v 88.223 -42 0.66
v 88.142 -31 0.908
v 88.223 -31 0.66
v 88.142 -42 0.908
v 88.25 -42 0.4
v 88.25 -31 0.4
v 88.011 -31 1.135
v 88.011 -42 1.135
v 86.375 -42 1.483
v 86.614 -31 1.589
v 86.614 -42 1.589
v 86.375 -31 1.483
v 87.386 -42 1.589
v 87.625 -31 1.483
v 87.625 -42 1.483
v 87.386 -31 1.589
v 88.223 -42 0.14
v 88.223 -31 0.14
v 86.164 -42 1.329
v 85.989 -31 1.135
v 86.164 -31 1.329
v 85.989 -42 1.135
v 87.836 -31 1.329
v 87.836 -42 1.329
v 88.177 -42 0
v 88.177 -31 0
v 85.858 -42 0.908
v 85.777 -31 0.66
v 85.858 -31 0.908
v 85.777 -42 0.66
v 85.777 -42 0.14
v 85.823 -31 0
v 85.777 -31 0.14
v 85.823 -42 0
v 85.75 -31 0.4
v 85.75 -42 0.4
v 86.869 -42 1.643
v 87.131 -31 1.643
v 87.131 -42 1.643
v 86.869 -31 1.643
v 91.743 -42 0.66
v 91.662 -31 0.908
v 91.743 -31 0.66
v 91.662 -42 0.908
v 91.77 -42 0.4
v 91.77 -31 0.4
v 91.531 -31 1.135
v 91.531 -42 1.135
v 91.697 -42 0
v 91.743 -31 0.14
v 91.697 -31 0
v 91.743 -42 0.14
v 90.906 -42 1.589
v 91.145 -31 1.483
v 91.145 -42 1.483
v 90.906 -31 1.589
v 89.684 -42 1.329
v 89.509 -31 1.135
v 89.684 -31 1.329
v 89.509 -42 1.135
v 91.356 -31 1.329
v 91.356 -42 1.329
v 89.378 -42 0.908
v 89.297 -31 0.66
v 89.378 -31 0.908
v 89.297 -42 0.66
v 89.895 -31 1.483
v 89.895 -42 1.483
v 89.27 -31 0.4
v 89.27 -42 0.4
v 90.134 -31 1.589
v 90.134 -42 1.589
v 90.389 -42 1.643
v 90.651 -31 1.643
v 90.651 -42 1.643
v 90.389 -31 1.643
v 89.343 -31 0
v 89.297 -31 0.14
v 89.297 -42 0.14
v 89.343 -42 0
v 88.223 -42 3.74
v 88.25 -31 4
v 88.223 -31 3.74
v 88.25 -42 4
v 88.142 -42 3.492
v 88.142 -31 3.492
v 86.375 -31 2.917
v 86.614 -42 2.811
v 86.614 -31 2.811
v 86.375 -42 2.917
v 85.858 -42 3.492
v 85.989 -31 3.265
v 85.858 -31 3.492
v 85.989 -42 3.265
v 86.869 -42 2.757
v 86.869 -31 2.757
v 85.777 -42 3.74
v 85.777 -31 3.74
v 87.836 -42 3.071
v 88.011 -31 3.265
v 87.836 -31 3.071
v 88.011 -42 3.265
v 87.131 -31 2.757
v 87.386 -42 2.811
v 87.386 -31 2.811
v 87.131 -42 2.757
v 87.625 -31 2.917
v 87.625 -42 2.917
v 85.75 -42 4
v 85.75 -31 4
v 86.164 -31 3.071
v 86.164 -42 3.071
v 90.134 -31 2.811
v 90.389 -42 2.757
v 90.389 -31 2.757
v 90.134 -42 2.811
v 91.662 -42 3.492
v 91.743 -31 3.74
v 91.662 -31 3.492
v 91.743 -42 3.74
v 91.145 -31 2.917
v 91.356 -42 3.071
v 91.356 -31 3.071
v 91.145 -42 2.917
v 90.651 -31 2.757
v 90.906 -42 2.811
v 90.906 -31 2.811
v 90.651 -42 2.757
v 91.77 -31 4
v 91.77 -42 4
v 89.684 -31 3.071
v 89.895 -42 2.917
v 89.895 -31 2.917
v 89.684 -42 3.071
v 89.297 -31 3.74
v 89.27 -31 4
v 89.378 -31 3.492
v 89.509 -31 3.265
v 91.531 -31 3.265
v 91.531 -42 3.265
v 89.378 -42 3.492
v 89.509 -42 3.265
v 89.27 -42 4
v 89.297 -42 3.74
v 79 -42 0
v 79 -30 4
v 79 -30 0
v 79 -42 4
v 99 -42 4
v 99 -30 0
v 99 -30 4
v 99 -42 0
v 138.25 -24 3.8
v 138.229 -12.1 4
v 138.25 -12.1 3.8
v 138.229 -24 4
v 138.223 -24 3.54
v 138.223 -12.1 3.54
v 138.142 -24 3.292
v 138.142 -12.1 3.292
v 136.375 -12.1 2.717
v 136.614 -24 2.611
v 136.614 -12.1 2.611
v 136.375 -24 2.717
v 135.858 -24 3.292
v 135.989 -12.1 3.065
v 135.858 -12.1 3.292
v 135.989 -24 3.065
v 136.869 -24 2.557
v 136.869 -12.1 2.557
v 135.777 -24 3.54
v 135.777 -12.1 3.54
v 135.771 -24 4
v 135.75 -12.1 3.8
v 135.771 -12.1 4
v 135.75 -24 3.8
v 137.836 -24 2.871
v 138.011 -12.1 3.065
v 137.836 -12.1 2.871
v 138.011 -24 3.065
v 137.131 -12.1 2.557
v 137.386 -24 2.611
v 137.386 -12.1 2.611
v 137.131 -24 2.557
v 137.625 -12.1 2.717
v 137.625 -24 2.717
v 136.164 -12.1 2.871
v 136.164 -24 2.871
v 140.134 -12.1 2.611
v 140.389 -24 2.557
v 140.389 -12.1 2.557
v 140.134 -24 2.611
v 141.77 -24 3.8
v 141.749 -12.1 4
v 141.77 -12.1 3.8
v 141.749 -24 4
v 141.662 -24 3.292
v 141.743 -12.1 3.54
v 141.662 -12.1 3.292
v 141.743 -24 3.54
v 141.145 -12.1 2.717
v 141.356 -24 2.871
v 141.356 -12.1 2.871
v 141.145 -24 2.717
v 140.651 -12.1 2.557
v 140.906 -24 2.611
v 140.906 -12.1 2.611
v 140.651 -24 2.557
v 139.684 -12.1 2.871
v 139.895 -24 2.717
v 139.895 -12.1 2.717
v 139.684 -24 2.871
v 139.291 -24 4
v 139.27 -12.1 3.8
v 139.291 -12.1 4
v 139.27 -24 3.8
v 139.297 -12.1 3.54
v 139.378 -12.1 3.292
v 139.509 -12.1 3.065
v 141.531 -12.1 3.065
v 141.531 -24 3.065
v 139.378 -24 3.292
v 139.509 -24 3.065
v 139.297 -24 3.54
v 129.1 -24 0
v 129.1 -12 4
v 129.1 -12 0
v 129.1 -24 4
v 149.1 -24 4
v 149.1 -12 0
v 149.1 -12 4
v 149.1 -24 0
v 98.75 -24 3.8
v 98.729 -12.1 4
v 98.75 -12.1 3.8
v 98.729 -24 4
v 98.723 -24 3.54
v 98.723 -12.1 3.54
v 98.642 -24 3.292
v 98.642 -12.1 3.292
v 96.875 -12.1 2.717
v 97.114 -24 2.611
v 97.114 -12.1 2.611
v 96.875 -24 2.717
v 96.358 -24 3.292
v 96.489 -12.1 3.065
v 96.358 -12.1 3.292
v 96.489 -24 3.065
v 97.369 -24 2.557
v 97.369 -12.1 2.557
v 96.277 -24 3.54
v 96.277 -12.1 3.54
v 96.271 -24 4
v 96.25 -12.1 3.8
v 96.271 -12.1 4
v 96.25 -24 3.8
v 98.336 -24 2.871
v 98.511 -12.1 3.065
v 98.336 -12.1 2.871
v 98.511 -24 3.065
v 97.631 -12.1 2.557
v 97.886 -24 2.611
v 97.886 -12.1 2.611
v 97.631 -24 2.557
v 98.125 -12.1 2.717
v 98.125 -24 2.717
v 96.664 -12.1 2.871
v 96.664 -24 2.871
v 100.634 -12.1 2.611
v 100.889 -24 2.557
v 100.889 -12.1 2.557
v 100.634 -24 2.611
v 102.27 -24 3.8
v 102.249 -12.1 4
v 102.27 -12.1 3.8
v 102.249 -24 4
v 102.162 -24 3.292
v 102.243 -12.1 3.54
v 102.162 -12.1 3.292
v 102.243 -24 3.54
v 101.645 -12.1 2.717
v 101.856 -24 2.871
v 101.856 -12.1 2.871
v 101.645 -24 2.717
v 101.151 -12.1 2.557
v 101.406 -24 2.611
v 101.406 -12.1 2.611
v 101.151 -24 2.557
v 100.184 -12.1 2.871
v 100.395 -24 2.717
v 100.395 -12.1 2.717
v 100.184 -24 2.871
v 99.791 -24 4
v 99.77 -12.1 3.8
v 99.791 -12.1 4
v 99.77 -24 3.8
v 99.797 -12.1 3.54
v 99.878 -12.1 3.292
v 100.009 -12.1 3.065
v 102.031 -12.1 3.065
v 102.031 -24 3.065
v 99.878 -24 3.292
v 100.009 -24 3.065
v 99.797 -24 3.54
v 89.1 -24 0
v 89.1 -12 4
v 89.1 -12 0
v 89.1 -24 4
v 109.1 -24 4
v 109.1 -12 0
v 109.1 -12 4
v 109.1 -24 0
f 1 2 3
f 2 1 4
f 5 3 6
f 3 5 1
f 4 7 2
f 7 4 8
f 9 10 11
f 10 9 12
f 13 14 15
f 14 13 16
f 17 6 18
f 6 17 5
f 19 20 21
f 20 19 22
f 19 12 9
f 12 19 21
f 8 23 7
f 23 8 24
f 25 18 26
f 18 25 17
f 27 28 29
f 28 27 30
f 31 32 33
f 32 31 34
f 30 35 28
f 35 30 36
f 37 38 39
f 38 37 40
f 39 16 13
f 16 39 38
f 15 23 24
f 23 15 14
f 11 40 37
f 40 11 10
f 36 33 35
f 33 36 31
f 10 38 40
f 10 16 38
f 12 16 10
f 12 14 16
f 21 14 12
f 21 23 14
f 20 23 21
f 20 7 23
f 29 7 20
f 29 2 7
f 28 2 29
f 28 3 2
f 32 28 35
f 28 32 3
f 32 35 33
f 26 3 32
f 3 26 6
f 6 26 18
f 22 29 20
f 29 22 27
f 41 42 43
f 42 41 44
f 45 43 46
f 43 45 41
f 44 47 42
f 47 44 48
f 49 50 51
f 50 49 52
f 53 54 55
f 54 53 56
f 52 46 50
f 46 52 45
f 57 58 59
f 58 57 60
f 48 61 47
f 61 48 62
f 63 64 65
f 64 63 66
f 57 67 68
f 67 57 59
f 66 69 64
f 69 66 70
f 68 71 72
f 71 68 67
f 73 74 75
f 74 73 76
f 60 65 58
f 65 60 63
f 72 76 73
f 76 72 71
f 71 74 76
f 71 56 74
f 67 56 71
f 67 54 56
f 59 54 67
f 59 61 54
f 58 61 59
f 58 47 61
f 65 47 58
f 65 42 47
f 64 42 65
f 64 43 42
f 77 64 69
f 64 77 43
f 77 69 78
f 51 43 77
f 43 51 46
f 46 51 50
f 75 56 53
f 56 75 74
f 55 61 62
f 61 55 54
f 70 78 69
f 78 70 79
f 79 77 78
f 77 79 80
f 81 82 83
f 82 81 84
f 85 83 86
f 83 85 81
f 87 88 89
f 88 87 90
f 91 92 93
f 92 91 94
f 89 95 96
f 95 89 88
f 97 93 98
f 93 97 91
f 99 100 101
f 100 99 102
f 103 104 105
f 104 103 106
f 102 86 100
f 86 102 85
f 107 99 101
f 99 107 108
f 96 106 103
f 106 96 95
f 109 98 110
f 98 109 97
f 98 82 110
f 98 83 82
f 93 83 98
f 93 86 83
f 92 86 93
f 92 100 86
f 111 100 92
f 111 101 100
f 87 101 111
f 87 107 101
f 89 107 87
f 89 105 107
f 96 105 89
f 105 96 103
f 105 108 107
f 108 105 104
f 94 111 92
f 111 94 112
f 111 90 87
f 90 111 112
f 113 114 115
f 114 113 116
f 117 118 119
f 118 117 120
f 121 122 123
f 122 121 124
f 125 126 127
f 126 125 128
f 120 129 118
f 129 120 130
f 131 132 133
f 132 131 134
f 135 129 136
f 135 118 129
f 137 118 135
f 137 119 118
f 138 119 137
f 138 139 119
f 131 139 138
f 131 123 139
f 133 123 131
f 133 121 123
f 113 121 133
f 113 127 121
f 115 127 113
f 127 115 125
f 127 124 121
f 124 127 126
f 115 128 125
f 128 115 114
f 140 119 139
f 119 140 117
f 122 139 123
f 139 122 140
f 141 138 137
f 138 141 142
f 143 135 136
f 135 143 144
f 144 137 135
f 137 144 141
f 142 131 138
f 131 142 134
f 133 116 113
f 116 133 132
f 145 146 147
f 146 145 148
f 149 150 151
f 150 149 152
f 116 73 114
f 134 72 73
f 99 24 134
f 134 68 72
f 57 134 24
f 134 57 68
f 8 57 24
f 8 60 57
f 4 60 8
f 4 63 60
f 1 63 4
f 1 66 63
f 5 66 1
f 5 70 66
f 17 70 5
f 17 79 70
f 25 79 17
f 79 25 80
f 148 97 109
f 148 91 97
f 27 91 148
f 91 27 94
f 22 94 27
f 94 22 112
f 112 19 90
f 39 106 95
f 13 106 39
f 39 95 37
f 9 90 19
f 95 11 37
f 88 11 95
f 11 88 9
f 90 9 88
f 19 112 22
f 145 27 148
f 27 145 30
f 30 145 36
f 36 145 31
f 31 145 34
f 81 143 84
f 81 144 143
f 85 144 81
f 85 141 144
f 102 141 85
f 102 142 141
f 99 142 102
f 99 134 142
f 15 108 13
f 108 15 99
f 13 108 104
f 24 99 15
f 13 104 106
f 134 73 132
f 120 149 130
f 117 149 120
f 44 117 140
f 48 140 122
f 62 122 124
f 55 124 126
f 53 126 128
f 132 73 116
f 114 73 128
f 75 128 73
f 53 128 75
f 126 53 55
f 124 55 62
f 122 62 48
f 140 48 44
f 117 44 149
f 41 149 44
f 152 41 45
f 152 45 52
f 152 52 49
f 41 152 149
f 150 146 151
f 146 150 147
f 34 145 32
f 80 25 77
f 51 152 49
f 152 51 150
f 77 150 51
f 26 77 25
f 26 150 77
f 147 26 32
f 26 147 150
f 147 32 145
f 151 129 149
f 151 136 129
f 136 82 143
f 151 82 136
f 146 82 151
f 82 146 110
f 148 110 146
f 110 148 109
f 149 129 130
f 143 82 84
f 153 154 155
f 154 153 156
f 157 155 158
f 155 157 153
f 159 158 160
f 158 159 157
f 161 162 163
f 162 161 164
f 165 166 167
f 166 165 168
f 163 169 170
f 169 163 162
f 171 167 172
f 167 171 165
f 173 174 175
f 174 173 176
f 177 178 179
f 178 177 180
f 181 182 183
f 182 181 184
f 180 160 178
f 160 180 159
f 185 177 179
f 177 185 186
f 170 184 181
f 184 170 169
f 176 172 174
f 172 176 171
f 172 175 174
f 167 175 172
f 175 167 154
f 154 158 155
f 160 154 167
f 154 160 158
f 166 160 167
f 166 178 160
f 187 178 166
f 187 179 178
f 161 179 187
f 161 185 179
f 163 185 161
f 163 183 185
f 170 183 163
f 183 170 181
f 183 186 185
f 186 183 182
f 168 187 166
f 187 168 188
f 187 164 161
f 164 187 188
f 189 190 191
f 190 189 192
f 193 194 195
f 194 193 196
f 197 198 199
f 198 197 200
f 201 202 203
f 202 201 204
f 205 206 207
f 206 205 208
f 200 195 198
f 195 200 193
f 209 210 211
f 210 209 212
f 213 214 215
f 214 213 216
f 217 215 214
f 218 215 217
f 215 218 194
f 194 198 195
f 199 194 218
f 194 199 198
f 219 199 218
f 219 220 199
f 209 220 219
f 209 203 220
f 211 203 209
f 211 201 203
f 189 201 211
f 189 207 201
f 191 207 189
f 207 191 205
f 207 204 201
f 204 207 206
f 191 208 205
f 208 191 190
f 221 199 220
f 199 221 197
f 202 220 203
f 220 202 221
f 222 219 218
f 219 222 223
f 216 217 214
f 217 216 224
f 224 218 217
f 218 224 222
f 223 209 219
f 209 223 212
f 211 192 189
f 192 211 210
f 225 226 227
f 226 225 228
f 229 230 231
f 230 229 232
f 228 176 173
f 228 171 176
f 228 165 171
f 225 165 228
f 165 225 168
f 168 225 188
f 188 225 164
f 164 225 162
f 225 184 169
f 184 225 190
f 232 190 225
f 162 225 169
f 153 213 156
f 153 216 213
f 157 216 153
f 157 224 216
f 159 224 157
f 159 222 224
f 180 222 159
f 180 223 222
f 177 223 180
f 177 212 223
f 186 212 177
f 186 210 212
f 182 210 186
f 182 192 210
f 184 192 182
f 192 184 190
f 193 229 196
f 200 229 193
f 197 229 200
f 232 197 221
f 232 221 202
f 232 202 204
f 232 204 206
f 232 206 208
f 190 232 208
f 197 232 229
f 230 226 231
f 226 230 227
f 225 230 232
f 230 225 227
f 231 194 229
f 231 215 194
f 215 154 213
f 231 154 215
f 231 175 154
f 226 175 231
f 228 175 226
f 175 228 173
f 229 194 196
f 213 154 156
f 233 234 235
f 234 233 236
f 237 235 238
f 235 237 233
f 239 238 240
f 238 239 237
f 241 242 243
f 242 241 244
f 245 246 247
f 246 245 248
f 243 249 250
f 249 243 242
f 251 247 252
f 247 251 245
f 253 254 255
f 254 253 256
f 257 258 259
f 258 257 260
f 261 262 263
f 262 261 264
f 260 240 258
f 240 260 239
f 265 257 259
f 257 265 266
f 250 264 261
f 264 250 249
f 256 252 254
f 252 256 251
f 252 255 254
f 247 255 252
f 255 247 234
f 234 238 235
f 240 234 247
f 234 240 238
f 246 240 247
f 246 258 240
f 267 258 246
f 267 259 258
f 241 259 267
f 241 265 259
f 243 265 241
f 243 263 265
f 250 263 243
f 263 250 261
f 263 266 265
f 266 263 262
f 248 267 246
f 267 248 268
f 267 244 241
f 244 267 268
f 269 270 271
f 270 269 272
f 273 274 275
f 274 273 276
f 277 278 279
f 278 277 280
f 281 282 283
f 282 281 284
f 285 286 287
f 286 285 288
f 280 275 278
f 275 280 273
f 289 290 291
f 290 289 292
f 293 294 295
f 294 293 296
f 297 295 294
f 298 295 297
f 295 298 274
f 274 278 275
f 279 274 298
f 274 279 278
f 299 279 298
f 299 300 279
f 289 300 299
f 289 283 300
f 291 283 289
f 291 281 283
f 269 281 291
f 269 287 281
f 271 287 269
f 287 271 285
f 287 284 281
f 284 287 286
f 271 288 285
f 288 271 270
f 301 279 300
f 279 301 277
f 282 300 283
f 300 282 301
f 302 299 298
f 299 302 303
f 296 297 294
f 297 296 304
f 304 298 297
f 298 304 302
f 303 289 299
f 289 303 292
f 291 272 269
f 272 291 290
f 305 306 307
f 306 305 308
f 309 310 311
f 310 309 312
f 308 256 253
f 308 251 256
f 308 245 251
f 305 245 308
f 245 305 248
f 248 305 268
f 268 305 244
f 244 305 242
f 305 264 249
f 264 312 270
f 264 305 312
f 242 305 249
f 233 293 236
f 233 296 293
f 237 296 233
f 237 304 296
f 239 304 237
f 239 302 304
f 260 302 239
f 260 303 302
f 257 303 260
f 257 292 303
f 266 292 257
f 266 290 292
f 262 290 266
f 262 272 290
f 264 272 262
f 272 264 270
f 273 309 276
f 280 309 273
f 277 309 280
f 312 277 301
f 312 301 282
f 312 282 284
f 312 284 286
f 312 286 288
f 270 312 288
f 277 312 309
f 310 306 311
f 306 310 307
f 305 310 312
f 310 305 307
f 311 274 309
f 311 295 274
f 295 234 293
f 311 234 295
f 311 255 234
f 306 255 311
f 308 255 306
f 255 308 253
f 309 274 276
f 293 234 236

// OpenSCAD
/*

__________ ____ ___  _____________  __.___.____    .____     
\______   \    |   \/   _____/    |/ _|   |    |   |    |    
 |    |  _/    |   /\_____  \|      < |   |    |   |    |    
 |    |   \    |  / /        \    |  \|   |    |___|    |___ 
 |______  /______/ /_______  /____|__ \___|_______ \_______ \
        \/                 \/        \/           \/       \/


*/
/*                      
Buskill USB-A Magnetic breakaway Shell Assembly     
GNU General Public License v3.0 
Author: Melanie Allen
*/

/*
Description

BusKill is a Dead Man Switch triggered when a magnetic breakaway is tripped, severing a USB connection. This design is for USB-A.

The user will have a USB, a USB extension cable, and the magnetic breakaway. 

The "breakaway" receives the USB from the USB cable with a female USB port. It is in four parts, the base, two middle pieces, and the lid. It contains 4 pogo pins and 2 magnets. It separates from the release when the cord is pulled.

The "release" is attached to a cord ending in a male USB. It is in three parts, the base, the middle, and the lid. It contains 4 pogo receptors and 2 magnets.

The middle pieces are created in order to stabilize the pogo pins and magnets from the top and bottom pieces to keep them from interfering with each other.

When the magnets on the breakaway and release connect, the pogo pins and pogo receptors must meet and establish the USB connection.

The breakaway and release plugs must be designed asymmetrically to prevent the connection from happening the wrong way. 

The case must be designed so that the user can completely dissemble it and ensure there has been no tampering. No glue must be required. The base and lid connect together with tiny screws and embedded nuts. There will be a middle wall piece for both ends that separates top and bottom components.

This design differs from another design in the repo in that the magnets are modelled as disks. These disk magnets are easily found online and can be acquired more easily than the hexagonal magnets. 

docs.buskill.in
buskill.in
*/


module main(){

zpascifier = 0.02; //value to prevent z-fighting

/* * Magnet * */

//Download magnet2.stl from repo into the same folder as this .scad file

magnet_distance=12.5;

module magnet(){
    color( "SlateGrey", 1.0 )
    rotate([90,0,0])
        difference() {
    cylinder(h=2, r=2,$fn = 30);
}

    
}
//magnet();

/* * Notch * */

//The notch should extrude from the release, and cut into the breakaway so that they can only connect in one orientation.

module notch(){
    color("white"){
        rotate([90,0,0]){
            cylinder($fn = 30, $fa = 30, $fs = 2, .5,.5,.5,$fn=3);
        }
    }
}
//notch();

/* * Screw and Nut * */

module M3HexNut() {
  height = 6;
  size = 3.2;
  sides = 6;
  translate([0, 0, -height/2]) 
      cylinder(d=size, h=height, center=true);
    
}

//M3HexNut();


module M3Screw() {
s_h =7; // screw length
s_r1 = 1; // screw shaft radius
s_r2 = 2; // screw top radius

// create the screw body
cylinder(r = s_r1, h = 8, center = true);

// create the screw head
translate([0, 0, s_h - s_r2]) {
cylinder(r = s_r2, h = s_r2, center = true);
}
}
//M3Screw();

/*
__________       .__                               
\______   \ ____ |  |   ____ _____    ______ ____  
 |       _// __ \|  | _/ __ \\__  \  /  ___// __ \ 
 |    |   \  ___/|  |_\  ___/ / __ \_\___ \\  ___/ 
 |____|_  /\___  >____/\___  >____  /____  >\___  >
        \/     \/          \/     \/     \/     \/ 

*/

/* * * Create Release * * */

//The "release" plugs into the computer with a male USB. It is in three parts, the base, the middle piece, and the lid. It contains pogo receptors and magnets. (blue)

/* * Variables * */
    
//release block variables
o_h = 24; //x
o_w = 4; //z
o_d = 20; //y


//pogo receptor variables
//Pogo receptor is shaped like two cylinders, a larger one on top of a smaller one
ppr_top_d=3.2; // top cyclinder diameter
ppr_top_r=1.6;
ppr_top_h=1.5; // top cylinder height
ppr_bottom_d=2.1; //bottom cylinder diameter
ppr_bottom_r=1.2;
ppr_bottom_h=2; //bottom cyclinder height
ppr_d=1.2; //distance between pogo receptors

//pogo receptor
module two_pogo_recs(){  
    module pogo_rec(){
        //variables: ppr_top_r, ppr_top_h, ppr_bottom_r, ppr_bottom_h
        module pogo_rec_top(){
            translate([39.5,3,10])cylinder($fn = 30, $fa = 30, $fs = 2, h=ppr_top_h, r1=ppr_top_r, r2=ppr_top_r, center = false); 
        };
    pogo_rec_top();   
        module pogo_rec_bottom(){
            translate([39.5,3,10])translate([.05,0,1]){
                rotate([0,0,-18]){
                cylinder($fn = 30, $fa = 30, $fs = 2,h=ppr_bottom_h, r1=ppr_bottom_r, r2=ppr_bottom_r, center = false);
            }
        }
        };
    pogo_rec_bottom();
}
//pogo_rec();

    rotate([90,0,0]){
        pogo_rec();
    
        translate([pogo_distance,0,0]){
        pogo_rec();
        }
    }
}
//two_pogo_recs();

//USB_male variables
um_h = 14;
um_w = 15;
um_d = 6;

/* * Modules * */


module release_block(){
       rotate([90,0,0]){
            translate([30,0,-8]){
                cube(size = [o_h, o_w, o_d], center = false);
            }
        }
  
}; 
//release_block();


    module release_magnet(){
        translate([33,-16.15,-4.25-zpascifier]){
            magnet();
            translate([magnet_distance,0,-zpascifier]){
                magnet();
            }
        }
    }
//release_magnet();
    
        module usb_female(){
    translate([35,-6,1]){
        cube(size=[um_h,um_w,um_d], center = false);
    }
}
//usb_female();


module release_top_block(){
    release_block();
    
}

//release_top_block();

module release_top_void(){
    mag_position=-2;
    translate([0,1,-3])two_pogo_recs();
    translate([.5,0,mag_position])release_magnet();
    translate([0,0,-5])usb_female();
   
}
//release_top_void();

//create release top
 module create_release_top(){
     
   color("lightblue") difference(){
        release_top_block();
        release_top_void();
       translate([32.5,5,0])M3Screw();translate([51,5,0])M3Screw(); 
    }
}
//create_release_top();

//create release base

module release_base_block(){
        color("blue") translate([-30,0,0])release_block();
    
};
//release_base_block();

module release_base_void(){
translate([-30,1,1])two_pogo_recs();
    translate([-29.5,.3,.5])release_magnet();
    translate([-30,0,0])usb_female();
    
}
//release_base_void();

module create_release_base(){
 difference(){
        release_base_block();
        release_base_void();
     translate([2.5,5.5,4.75])M3HexNut();translate([21.5,5.5,4.75])M3HexNut(); 
    }
}
//create_release_base();


module create_release_m(){

    //block
    module release_block(){
        color("aquamarine",.55)
        translate([0,-20,0])  rotate([90,0,0]){
            translate([30,0,0]){
                cube(size = [o_h, o_w, o_d], center = false);
            }
        }  
    }   

module mid_void(){
    mag_top_h=-3.75;
    mag_bottom_h=mag_top_h-3;
    
    
    translate([35,-32,-zpascifier]) cube(size = [um_h, um_w, um_d], center = false);  //cut usb
                    translate([33.5,-43.25,mag_top_h]){
            magnet();
                    {
            translate([magnet_distance,0,-zpascifier]){
                magnet();           
            }}
        }
        
        translate([33.5,-43.25,mag_bottom_h]){
            magnet();
                    {
            translate([magnet_distance,0,-zpascifier]){
                magnet();           
            }}
        }
        
        //cut magnets
        
   rec_top_h=.75;
   rec_bottom_h=rec_top_h-3.5;
        
translate([0,-27,rec_top_h]) two_pogo_recs(); 
translate([0,-27,rec_bottom_h]) two_pogo_recs(); 
translate([32.5,-22.5,4.75])M3HexNut();translate([51.75,-22.5,4.75])M3HexNut(); 
}


//mid_void();

difference(){
    release_block();
     mid_void();
       
}

};

//create_release_m();



module create_release(){
create_release_top();
create_release_base();
create_release_m(); 
}

//create_release();


/*  
__________                       ___
\______   \_______   ____ _____  |  | _______ __  _  _______  ___.__.
 |    |  _/\_  __ \_/ __ \\__  \ |  |/ /\__  \\ \/ \/ /\__  \<   |  |
 |    |   \ |  | \/\  ___/ / __ \|    <  / __ \\     /  / __ \\___  |
 |______  / |__|    \___  >____  /__|_ \(____  /\/\_/  (____  / ____|
        \/              \/     \/     \/     \/             \/\/     

*/

/* * * Create Breakaway * * */
 
 //The "breakaway" receives the USB from the USB cable with a female USB port. It is in three parts, the base, the middle piece, and the lid. It contains pogo pins and magnets. (red)

/* * Variables * */

//breakaway base variables
i_h = 20; //x
i_w = 4; //z
i_d = 24; //y
 
i2_h = 8; //x
i2_w = 0; //y
i2_d = 2.5; //z

//breakaway top variables
i_l_h =i_h; //z
i_l_w = i_w; //x
i_l_d = i_d; //y

i2_l_h =i2_h; //z
i2_l_w = i2_w; //x
i2_l_d = i2_d; //y

//pogo variables
//pogo pins are shaped like a cylinder.

pogo_length=12;
pogo_tip_diameter=1;
pogo_diameter=1.25;
pogo_distance=3.5+zpascifier; //distance between pins (x=z)

/* * Breakaway Blocks * */
    module top_block(){
    color("Red",.55)
    translate([56.1,-12,0])  rotate([90,0,0]){
            translate([33,0,0]){
                cube(size = [i_l_h, i_l_w, i_l_d/2], center = false);
            }
        } 
    } 
  //  top_block();
    
        module base_block(){
    color("Pink",.55)
    translate([96.1,-12,0])  rotate([90,0,0]){
            translate([33,0,0]){
                cube(size = [i_l_h, i_l_w, i_l_d/2], center = false);
            }
        } 
    } 
   // base_block();
    
    module mid_block(){
    color("DeepPink",.55)
    translate([46,-30,0])  rotate([90,0,0]){
            translate([33,0,0]){
                cube(size = [i_l_h, i_l_w, i_l_d/2], center = false);
            }
        } 
    }
//mid_block();    

/* * Breakaway Top and Base Void */

/* * Pogo Pin * */
    module pogo_pin(){
    color("yellow"){
        rotate([90,0,0]){
            cylinder($fn = 30, $fa = 30, $fs = 2, h=pogo_length, r1=pogo_diameter, r2=pogo_diameter, center = false);
        translate([pogo_distance,0,0]){
            cylinder($fn = 30, $fa = 30, $fs = 2, h=pogo_length, r1=pogo_diameter, r2=pogo_diameter, center = false);
        }
    }
}
}
//pogo_pin();

/* * Magnet * */

module breakaway_magnet(){
        translate([52.5,-27.17,-5]){
            magnet();
            translate([magnet_distance,0,-zpascifier]){
                magnet();
            }
        }
    }
//breakaway_magnet();
    
        module void(){
        translate([97.5,-12.1,3.8]){
            pogo_pin();
            } //subtract pogo_pin
        translate([91,-27.2,-4]){
            magnet();
            translate([magnet_distance,0,-zpascifier]){
                magnet();
            } //subtract magnets
        }         
    };
    //void();

module create_breakaway_top(){
    difference(){
    top_block();
    translate([0,0,0])void();
    }
};
    
//create_breakaway_top();

//Base

module create_breakaway_base(){
    difference(){
   base_block();
     translate([39.5,0,0])void();
    }
};
//create_breakaway_base();

module create_breakaway_m(){
    
    //block

/* Breakaway Mid Void */

// unlike the base and lid voids, this void has the bottom of base pogo pin and the top of the lid pogo pins, allowing for the pins to be in place during assembly
    
    module void(){
        
        mag_top_h=-4;
        mag_bottom_h= mag_top_h-3;
        
        translate([1,0,0]){
        translate([86,-31,.4]) pogo_pin();
        translate([86,-31,4]) pogo_pin();  
   
        

   translate([79.5,-45.25,mag_top_h]){
            magnet();
                    {
            translate([magnet_distance,0,0]){
                magnet();           
            }}
        }
        
        translate([79.5,-45.25,mag_bottom_h]){
            magnet();
                    {
            translate([magnet_distance,0,0]){
                magnet();           
            }}
        }
              

    }
}
        difference(){
        mid_block();
        void();
     
    }
       // void();
}

module create_breakaway(){
    create_breakaway_m();
    create_breakaway_base();
    create_breakaway_top();
}
//create_breakaway();

/*

 _______   ________  __    __  _______   ________  _______  
/       \ /        |/  \  /  |/       \ /        |/       \ 
$$$$$$$  |$$$$$$$$/ $$  \ $$ |$$$$$$$  |$$$$$$$$/ $$$$$$$  |
$$ |__$$ |$$ |__    $$$  \$$ |$$ |  $$ |$$ |__    $$ |__$$ |
$$    $$< $$    |   $$$$  $$ |$$ |  $$ |$$    |   $$    $$< 
$$$$$$$  |$$$$$/     $$ $$ $$ |$$ |  $$ |$$$$$/    $$$$$$$  |
$$ |  $$ |$$ |_____ $$ |$$$$ |$$ |__$$ |$$ |_____ $$ |  $$ |
$$ |  $$ |$$       |$$ | $$$ |$$    $$/ $$       |$$ |  $$ |
$$/   $$/ $$$$$$$$/ $$/   $$/ $$$$$$$/  $$$$$$$$/ $$/   $$/


*/


/* * * RENDER ALL THE PARTS * * */

module create_all(){

create_breakaway();
create_release();  
    
}
//create_all();

/* * * RENDER AN INDIVIDUAL PART * * */

create_breakaway();
//create_breakaway_base();
//create_breakaway_top();
//create_breakaway_m();


//create_release();
//create_release_base();
//create_release_top();
//create_release_m();

/* * * MODEL ASSEMBLY * * */

module model_breakaway(){

translate([238,3,0])rotate([90,0,180])create_breakaway_top();
translate([50,11,18])rotate([90,0,0])create_breakaway_m(); 
    translate([0,15,0])rotate([90,0,0])create_breakaway_base();
    
}
//model_breakaway();

module model_release(){
translate([0,14,2])rotate([90,0,0])create_release_base();
translate([-30,6,2])rotate([90,0,0])create_release_top();
translate([-30,10,30])rotate([90,0,0])create_release_m();
}
//model_release();

}

main();
